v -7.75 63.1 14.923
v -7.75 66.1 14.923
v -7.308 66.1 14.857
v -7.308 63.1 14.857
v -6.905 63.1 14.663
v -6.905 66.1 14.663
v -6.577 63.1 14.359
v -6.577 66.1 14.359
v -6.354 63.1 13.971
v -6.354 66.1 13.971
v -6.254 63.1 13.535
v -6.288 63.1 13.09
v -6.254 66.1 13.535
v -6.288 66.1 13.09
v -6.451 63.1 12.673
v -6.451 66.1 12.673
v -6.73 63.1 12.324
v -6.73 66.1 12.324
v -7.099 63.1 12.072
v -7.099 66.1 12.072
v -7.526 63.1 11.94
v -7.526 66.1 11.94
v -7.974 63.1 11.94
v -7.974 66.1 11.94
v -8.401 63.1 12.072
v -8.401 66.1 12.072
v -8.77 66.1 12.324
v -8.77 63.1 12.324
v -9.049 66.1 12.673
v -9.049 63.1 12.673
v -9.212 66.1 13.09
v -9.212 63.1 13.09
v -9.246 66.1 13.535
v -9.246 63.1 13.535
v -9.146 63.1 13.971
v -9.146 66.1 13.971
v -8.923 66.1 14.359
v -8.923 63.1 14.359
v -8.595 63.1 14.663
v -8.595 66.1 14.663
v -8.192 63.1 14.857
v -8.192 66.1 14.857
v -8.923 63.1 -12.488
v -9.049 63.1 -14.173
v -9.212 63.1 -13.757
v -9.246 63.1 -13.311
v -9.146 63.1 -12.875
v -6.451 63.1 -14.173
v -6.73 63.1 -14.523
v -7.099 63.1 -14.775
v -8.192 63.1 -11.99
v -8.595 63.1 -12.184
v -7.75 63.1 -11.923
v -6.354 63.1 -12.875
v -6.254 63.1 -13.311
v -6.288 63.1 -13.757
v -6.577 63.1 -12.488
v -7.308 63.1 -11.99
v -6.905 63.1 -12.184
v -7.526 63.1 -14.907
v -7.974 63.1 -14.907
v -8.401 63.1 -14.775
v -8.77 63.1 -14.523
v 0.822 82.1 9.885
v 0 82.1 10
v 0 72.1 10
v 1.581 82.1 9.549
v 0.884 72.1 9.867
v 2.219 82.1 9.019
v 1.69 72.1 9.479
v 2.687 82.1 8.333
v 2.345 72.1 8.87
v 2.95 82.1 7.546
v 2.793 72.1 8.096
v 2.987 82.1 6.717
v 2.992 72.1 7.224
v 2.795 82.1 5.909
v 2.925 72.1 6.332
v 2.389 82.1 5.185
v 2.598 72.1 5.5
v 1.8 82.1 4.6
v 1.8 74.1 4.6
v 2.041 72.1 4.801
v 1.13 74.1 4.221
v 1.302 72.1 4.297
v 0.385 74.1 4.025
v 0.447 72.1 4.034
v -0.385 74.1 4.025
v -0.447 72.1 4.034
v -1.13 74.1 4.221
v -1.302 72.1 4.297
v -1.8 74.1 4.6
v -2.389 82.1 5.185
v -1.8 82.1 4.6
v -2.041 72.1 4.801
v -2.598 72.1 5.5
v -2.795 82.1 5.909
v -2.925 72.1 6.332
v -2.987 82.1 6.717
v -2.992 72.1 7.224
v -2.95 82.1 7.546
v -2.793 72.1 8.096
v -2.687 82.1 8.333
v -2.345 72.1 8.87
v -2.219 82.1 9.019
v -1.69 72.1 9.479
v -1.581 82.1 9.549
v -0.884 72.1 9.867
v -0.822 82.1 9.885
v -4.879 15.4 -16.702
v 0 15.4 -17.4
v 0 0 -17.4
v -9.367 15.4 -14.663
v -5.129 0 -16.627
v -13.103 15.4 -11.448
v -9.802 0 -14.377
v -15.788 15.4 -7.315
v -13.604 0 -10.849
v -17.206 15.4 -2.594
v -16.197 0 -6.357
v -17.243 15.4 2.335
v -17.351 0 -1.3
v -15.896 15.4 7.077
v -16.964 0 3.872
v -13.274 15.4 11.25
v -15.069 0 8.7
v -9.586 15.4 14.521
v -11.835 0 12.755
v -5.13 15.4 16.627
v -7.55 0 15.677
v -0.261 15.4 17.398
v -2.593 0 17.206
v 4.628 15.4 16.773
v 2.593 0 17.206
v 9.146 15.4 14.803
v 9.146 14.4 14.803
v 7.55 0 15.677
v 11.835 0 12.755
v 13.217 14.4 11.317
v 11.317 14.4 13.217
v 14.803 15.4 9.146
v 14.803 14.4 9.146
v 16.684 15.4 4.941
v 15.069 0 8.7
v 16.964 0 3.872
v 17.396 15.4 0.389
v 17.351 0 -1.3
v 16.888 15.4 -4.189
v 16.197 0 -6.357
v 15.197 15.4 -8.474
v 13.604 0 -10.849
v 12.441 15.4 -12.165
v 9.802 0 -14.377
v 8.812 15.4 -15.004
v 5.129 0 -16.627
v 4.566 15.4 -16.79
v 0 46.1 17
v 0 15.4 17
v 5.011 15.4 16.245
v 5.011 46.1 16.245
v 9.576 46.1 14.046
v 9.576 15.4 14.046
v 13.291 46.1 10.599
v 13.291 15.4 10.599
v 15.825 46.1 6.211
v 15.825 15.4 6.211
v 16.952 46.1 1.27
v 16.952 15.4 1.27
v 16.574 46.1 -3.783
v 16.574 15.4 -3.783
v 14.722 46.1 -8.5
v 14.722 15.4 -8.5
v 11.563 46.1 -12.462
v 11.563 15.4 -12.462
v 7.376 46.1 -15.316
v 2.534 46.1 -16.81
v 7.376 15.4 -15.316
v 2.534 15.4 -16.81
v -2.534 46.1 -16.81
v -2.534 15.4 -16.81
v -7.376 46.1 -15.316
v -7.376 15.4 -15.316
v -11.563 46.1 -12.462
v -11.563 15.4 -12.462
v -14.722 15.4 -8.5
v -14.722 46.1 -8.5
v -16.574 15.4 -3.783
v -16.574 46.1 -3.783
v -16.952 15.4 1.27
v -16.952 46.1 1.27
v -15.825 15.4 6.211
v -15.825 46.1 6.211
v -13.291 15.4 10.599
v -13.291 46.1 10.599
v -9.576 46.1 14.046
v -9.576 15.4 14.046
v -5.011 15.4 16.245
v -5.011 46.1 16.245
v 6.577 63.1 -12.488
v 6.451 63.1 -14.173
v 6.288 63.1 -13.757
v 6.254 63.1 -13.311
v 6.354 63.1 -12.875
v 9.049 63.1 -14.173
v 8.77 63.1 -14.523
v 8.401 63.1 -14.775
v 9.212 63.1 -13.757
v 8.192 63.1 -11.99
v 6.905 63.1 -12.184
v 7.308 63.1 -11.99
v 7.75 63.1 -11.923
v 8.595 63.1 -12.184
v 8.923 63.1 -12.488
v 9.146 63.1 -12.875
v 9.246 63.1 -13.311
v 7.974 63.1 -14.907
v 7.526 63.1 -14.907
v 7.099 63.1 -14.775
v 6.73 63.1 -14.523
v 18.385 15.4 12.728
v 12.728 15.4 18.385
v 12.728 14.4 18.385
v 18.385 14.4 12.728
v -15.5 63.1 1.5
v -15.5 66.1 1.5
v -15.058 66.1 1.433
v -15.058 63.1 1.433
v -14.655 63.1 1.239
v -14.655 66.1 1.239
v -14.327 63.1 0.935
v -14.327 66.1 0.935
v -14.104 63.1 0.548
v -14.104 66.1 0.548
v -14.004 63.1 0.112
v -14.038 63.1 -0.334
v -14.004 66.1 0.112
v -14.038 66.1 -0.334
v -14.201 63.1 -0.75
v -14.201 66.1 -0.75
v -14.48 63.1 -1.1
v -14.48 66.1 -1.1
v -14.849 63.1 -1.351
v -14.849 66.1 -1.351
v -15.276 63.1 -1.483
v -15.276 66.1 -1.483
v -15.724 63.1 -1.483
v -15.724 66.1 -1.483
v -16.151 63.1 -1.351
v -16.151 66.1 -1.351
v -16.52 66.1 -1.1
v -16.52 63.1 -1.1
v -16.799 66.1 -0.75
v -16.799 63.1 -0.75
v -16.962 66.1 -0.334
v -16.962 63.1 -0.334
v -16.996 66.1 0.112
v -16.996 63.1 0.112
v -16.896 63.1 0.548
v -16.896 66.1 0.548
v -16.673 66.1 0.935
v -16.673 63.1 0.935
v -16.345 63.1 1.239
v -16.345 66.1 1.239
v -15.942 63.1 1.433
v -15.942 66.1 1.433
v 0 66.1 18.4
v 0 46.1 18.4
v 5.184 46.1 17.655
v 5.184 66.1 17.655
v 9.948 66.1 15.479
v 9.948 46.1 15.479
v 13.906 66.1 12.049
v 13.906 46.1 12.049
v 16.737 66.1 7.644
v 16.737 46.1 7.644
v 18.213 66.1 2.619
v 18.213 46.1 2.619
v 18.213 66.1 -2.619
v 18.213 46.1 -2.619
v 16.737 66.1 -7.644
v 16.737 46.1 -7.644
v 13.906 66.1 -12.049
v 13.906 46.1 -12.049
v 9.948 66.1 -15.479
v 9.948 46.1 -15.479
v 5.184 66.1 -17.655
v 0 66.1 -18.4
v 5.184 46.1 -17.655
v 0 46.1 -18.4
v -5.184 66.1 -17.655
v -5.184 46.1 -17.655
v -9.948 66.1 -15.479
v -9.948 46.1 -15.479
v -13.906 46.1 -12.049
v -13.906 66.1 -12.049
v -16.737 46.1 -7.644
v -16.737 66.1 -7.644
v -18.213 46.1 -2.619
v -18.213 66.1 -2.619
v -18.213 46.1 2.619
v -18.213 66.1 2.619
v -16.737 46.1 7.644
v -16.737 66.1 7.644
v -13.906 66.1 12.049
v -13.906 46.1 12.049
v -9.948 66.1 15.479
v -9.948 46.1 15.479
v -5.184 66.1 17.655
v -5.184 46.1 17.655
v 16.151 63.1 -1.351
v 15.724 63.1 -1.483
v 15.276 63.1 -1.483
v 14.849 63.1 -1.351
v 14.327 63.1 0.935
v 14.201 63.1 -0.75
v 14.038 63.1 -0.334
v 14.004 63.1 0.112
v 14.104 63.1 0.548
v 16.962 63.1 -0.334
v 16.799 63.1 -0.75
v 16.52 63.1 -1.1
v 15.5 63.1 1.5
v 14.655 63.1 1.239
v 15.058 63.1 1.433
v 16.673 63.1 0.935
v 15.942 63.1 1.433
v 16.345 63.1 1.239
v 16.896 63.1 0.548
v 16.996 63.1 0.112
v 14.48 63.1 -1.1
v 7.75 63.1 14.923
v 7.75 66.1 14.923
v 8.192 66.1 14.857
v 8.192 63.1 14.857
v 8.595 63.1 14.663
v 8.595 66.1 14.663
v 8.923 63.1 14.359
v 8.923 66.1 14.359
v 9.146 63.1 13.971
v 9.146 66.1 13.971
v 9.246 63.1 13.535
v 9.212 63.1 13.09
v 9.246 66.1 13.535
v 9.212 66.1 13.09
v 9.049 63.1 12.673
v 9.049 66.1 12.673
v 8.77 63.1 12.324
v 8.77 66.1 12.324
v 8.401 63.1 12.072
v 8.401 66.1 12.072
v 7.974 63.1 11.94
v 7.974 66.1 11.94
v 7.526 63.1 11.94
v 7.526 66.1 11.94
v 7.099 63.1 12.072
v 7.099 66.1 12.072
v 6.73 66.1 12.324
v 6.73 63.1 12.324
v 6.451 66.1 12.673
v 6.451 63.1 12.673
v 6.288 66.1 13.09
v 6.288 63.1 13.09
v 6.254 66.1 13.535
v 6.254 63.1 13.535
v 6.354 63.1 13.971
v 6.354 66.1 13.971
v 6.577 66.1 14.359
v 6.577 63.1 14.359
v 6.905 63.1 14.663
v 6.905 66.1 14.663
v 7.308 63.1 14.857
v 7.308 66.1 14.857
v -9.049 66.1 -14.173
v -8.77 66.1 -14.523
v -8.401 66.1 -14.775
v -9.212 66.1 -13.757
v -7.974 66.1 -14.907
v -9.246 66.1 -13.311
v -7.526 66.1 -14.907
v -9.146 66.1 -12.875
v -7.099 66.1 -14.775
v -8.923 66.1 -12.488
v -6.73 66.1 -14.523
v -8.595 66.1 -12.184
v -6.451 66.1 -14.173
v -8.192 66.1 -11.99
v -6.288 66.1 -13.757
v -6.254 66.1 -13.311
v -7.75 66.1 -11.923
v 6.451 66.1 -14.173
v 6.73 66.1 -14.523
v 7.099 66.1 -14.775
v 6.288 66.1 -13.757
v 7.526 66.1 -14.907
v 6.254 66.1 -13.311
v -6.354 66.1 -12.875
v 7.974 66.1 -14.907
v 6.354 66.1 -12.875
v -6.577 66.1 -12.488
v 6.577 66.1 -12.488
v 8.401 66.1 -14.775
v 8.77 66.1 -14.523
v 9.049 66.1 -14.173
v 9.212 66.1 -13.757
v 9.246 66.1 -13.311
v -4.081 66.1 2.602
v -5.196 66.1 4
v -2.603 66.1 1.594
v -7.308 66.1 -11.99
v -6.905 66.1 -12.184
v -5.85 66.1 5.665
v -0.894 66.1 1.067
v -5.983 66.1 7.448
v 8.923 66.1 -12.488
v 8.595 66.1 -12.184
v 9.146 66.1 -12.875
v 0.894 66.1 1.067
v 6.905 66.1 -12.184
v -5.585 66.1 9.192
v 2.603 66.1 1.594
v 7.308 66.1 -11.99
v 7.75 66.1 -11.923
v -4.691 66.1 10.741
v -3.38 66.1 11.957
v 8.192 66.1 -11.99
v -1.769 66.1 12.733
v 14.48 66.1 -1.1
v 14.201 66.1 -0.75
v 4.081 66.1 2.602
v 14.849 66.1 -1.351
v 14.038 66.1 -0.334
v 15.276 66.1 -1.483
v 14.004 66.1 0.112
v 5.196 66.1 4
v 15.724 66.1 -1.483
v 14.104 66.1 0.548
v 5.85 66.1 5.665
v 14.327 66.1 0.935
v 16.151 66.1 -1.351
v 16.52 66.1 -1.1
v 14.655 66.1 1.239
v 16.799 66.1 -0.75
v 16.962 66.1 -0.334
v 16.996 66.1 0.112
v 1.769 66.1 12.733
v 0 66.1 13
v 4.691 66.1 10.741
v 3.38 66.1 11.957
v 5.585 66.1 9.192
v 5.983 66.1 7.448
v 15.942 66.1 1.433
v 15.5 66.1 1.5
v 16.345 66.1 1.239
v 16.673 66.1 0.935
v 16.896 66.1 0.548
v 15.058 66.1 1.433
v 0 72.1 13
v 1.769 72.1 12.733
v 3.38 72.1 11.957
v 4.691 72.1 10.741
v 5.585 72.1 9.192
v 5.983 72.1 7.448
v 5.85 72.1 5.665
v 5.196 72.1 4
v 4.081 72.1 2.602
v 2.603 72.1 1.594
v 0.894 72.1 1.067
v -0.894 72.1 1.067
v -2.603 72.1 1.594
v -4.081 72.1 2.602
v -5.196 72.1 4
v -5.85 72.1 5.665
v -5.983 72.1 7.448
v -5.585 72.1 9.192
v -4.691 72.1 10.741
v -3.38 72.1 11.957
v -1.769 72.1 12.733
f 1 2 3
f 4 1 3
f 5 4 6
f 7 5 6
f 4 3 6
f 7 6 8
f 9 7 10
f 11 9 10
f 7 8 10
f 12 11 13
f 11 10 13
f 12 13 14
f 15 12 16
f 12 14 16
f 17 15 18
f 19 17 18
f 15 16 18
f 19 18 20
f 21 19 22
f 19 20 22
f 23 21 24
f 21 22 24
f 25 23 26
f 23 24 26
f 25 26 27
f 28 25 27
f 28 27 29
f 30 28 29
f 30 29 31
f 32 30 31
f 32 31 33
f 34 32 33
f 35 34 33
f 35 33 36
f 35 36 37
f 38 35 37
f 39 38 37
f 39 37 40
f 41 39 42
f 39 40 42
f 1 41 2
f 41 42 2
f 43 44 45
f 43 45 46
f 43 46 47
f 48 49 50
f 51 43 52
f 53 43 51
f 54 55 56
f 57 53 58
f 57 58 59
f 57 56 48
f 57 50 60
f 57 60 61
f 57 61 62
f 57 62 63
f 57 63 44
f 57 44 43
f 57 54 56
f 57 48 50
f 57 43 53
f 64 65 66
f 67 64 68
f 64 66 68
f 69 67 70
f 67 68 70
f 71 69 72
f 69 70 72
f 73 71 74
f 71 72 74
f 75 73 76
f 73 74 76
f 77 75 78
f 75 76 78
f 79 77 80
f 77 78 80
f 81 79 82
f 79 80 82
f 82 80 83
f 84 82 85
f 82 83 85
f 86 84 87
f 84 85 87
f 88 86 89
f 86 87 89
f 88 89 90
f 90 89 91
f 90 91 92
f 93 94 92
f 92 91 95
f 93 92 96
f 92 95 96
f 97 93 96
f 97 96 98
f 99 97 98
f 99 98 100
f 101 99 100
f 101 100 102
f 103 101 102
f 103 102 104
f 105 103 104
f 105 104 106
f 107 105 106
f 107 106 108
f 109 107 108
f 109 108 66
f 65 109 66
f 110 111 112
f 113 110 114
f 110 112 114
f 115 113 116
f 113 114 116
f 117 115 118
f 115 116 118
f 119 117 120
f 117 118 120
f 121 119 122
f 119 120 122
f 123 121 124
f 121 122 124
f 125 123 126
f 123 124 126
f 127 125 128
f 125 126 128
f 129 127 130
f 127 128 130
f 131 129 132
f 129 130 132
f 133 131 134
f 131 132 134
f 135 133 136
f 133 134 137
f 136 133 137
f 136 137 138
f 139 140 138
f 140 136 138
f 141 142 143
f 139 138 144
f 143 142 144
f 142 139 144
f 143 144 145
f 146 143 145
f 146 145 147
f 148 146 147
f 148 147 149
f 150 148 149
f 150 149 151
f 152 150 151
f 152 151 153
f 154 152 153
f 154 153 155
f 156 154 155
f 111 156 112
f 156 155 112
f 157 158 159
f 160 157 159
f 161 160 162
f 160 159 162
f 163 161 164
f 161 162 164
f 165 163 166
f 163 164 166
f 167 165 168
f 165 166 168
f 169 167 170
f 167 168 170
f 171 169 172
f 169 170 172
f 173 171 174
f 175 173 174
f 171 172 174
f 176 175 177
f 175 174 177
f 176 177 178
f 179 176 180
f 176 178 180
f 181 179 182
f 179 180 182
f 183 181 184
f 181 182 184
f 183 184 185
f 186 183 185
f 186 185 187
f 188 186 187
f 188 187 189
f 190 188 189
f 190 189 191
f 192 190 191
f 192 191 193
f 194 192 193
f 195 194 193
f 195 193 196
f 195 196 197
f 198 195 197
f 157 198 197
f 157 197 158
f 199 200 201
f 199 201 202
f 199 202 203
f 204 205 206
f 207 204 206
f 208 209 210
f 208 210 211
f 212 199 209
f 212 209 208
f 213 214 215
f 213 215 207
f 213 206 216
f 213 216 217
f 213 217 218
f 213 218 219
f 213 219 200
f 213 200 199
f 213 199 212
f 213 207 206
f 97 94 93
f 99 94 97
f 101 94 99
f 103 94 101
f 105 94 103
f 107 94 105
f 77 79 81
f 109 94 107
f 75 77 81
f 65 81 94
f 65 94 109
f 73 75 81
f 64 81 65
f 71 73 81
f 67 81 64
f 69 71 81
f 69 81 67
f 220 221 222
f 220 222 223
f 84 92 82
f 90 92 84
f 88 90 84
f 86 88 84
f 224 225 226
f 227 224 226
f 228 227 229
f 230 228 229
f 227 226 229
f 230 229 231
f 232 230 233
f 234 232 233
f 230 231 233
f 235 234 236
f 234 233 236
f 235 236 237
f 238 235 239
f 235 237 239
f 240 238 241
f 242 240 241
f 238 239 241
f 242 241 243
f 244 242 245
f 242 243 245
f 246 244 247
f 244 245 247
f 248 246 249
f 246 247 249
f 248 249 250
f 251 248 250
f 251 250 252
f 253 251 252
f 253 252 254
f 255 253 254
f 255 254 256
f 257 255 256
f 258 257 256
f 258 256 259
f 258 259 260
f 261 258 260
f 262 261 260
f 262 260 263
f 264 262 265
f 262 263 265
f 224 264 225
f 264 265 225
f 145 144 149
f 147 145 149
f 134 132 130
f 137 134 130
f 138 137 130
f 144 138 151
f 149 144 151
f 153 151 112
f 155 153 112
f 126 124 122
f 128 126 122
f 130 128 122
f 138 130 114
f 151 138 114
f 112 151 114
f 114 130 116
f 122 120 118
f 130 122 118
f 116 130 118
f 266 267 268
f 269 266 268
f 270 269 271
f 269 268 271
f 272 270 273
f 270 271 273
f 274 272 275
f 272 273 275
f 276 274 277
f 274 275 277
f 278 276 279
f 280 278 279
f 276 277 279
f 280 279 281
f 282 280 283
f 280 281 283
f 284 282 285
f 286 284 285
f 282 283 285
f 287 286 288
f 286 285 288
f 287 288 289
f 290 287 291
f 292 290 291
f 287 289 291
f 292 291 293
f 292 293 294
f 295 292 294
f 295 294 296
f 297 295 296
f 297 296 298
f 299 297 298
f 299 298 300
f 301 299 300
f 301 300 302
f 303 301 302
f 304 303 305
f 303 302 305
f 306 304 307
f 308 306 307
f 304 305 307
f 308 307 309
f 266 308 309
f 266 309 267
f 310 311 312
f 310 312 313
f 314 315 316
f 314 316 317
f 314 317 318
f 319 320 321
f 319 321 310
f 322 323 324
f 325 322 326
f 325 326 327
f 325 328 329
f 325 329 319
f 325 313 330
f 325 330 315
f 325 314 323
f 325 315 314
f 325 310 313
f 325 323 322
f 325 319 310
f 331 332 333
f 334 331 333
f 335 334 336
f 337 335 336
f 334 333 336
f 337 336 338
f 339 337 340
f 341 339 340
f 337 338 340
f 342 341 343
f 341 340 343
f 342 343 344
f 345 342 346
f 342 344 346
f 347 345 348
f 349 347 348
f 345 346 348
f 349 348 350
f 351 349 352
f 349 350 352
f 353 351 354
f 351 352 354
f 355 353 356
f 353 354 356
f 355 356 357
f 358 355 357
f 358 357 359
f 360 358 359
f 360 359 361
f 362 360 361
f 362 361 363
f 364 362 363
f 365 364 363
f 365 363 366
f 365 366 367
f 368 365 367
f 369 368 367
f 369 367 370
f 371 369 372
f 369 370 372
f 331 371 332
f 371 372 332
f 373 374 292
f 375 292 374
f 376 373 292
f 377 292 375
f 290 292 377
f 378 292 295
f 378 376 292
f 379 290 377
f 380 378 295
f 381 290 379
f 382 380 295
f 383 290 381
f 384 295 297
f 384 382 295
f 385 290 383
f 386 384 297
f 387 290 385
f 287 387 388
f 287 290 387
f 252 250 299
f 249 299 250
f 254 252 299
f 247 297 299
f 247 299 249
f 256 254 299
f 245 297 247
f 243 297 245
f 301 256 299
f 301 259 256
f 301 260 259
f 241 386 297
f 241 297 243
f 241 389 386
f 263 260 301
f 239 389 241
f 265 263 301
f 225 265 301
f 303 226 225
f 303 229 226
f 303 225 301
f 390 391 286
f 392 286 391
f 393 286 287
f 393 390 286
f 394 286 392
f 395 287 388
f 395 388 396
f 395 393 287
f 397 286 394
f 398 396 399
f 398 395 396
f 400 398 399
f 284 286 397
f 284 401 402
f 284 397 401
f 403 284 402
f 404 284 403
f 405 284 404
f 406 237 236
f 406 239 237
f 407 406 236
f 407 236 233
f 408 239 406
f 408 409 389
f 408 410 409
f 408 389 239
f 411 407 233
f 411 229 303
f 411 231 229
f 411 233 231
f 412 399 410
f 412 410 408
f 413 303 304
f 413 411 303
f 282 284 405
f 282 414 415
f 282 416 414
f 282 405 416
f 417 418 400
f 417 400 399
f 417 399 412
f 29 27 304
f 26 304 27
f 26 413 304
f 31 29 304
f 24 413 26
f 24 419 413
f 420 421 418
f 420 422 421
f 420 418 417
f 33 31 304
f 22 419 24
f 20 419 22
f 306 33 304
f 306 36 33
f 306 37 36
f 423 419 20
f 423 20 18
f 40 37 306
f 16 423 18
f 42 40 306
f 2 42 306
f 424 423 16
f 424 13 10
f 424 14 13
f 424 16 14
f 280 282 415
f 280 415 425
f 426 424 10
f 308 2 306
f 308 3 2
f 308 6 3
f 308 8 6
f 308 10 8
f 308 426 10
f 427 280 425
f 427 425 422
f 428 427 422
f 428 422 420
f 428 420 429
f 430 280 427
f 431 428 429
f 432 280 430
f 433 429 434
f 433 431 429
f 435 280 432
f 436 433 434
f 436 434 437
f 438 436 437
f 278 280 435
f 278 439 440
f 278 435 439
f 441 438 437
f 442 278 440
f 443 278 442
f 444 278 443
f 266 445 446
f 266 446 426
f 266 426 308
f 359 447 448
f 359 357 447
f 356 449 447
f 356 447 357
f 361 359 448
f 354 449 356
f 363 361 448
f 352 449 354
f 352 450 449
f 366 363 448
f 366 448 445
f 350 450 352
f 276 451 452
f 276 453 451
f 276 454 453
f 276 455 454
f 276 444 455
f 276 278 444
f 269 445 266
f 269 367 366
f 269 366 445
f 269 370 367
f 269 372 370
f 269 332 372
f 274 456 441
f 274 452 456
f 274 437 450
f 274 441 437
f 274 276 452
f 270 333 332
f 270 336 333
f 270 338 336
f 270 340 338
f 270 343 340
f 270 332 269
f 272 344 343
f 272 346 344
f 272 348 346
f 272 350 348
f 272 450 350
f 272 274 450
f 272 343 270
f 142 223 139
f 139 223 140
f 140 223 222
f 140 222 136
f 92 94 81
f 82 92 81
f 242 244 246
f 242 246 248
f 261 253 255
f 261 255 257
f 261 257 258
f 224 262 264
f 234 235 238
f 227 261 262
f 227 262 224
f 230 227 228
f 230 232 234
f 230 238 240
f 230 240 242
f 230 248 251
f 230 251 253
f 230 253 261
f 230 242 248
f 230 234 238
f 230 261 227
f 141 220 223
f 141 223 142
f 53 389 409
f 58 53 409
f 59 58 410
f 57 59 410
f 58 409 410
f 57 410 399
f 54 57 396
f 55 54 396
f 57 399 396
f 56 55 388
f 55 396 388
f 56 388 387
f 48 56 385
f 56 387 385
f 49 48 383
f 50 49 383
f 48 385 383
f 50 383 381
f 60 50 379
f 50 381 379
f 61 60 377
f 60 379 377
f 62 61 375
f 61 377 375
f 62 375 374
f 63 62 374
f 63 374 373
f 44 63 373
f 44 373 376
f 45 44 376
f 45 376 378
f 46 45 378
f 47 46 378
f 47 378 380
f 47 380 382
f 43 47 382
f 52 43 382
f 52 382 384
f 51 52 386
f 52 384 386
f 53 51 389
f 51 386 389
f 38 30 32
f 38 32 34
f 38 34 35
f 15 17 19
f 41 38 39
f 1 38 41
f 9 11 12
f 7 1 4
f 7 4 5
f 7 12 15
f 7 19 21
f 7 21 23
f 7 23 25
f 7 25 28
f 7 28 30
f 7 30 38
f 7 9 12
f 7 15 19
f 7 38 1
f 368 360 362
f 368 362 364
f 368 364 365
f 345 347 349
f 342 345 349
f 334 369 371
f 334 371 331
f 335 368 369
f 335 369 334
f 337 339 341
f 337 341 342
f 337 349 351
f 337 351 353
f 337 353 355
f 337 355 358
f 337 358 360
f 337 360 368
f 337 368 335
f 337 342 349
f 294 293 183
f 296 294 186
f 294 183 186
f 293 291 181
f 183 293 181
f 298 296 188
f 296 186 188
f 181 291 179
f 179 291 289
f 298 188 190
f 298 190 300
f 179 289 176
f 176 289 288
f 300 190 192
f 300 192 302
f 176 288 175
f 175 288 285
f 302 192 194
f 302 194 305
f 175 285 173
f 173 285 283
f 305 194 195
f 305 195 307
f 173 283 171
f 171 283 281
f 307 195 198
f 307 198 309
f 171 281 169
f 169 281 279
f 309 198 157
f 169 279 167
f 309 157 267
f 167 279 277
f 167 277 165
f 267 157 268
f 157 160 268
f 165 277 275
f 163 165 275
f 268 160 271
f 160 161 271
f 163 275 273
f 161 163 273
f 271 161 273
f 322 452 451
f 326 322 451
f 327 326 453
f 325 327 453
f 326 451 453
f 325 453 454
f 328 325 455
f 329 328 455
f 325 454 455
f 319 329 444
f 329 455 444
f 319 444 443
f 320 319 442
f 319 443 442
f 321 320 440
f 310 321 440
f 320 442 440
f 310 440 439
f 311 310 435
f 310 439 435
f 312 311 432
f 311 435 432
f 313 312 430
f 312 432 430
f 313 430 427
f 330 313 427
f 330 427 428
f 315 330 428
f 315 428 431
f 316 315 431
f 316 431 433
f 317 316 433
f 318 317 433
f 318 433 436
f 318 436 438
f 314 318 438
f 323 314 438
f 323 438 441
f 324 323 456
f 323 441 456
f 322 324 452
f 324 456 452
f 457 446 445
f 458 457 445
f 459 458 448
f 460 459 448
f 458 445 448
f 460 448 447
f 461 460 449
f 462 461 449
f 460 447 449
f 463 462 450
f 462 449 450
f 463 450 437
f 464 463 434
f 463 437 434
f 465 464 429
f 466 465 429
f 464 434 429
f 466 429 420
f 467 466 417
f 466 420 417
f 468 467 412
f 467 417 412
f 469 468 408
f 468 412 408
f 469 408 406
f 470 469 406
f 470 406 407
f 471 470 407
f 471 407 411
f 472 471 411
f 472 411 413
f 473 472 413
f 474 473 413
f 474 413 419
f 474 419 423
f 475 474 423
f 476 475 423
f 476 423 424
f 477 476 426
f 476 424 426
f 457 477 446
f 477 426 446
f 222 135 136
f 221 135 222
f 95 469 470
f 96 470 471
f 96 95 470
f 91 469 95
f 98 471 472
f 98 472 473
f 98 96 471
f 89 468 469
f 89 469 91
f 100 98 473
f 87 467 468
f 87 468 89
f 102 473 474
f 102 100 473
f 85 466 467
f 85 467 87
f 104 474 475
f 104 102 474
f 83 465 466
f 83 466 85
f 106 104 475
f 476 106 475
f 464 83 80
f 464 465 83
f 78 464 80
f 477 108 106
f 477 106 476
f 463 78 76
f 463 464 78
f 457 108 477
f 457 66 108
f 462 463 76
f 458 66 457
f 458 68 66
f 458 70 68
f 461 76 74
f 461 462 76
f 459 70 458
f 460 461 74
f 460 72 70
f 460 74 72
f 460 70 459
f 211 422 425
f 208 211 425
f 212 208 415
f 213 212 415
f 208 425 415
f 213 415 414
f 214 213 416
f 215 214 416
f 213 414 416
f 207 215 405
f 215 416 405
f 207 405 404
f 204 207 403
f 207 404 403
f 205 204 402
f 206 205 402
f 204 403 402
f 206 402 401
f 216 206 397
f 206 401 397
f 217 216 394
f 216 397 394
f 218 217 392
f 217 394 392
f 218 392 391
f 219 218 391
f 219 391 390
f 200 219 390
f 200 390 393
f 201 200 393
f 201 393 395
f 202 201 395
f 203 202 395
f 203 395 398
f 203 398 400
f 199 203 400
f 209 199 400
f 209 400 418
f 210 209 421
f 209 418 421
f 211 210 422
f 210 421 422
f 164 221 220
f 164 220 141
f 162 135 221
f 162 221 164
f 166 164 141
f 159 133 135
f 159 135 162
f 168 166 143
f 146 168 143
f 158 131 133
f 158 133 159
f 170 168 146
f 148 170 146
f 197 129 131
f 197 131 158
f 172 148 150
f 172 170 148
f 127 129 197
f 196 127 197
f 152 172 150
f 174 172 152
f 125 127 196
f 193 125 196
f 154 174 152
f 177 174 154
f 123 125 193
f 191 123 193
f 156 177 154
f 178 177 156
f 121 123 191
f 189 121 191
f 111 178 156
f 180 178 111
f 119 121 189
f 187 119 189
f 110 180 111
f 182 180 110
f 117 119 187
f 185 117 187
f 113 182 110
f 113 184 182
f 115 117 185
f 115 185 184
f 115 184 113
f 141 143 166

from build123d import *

# Parameters (mm, degrees)
SKETCH1_R           = 17.4
BOSS_EXTRUDE1_DEPTH = 15.4
SKETCH6_R           = 17
BOSS_EXTRUDE5_DEPTH = 30.7
SKETCH7_R           = 18.4
BOSS_EXTRUDE6_DEPTH = 20
SKETCH2_R           = 6
BOSS_EXTRUDE2_DEPTH = 6
SKETCH3_R           = 3
BOSS_EXTRUDE4_DEPTH = 10
SKETCH4_W           = 6
SKETCH4_H           = 8
CUT_EXTRUDE1_DEPTH  = 10
BOSS_EXTRUDE7_DEPTH = 1
SKETCH5_R           = 1.5
CUT_EXTRUDE2_DEPTH  = 3


with BuildPart() as part:
    # Sketch1 → Boss-Extrude1 (new body)
    with BuildSketch(Plane(origin=(0, 0, 0), x_dir=(1, 0, 0), z_dir=(0, 1, 0))):
        Circle(SKETCH1_R)
    extrude(amount=BOSS_EXTRUDE1_DEPTH)

    # Sketch6 → Boss-Extrude5 (add)
    with BuildSketch(Plane(origin=(0, 15.4, 0), x_dir=(1, 0, 0), z_dir=(0, 1, 0))):
        Circle(SKETCH6_R)
    extrude(amount=BOSS_EXTRUDE5_DEPTH)

    # Sketch7 → Boss-Extrude6 (add)
    with BuildSketch(Plane(origin=(0, 46.1, 0), x_dir=(1, 0, 0), z_dir=(0, 1, 0))):
        Circle(SKETCH7_R)
    extrude(amount=BOSS_EXTRUDE6_DEPTH)

    # Sketch2 → Boss-Extrude2 (add)
    with BuildSketch(Plane(origin=(0, 66.1, 0), x_dir=(1, 0, 0), z_dir=(0, 1, 0))):
        with Locations((0, -7)):
            Circle(SKETCH2_R)
    extrude(amount=BOSS_EXTRUDE2_DEPTH)

    # Sketch3 → Boss-Extrude4 (add)
    with BuildSketch(Plane(origin=(0, 72.1, 0), x_dir=(1, 0, 0), z_dir=(0, 1, 0))):
        with Locations((0, -7)):
            Circle(SKETCH3_R)
    extrude(amount=BOSS_EXTRUDE4_DEPTH)

    # Sketch4 → Cut-Extrude1 (cut)
    with BuildSketch(Plane.XY.offset(4.6)):
        with Locations((0, 78.1)):
            Rectangle(SKETCH4_W, SKETCH4_H)
    extrude(amount=-CUT_EXTRUDE1_DEPTH, mode=Mode.SUBTRACT)

    # Sketch8 → Boss-Extrude7 (add)
    with BuildSketch(Plane.XZ.offset(-15.4)):
        Polygon((2.828427125, -2.828427125), (-2.828427125, 2.828427125), (12.727922061, 18.384776311), (18.384776311, 12.727922061), align=None)
    extrude(amount=BOSS_EXTRUDE7_DEPTH)

    # Sketch5 → Cut-Extrude2 (cut)
    with BuildSketch(Plane(origin=(0, 66.1, 0), x_dir=(1, 0, 0), z_dir=(0, 1, 0))):
        with Locations((-7.75, 13.423393759)):
            Circle(SKETCH5_R)
        with Locations((7.75, 13.423393759)):
            Circle(SKETCH5_R)
        with Locations((-15.5, 0)):
            Circle(SKETCH5_R)
        with Locations((15.5, 0)):
            Circle(SKETCH5_R)
        with Locations((7.75, -13.423393759)):
            Circle(SKETCH5_R)
        with Locations((-7.75, -13.423393759)):
            Circle(SKETCH5_R)
    extrude(amount=-CUT_EXTRUDE2_DEPTH, mode=Mode.SUBTRACT)


solid = part.part
